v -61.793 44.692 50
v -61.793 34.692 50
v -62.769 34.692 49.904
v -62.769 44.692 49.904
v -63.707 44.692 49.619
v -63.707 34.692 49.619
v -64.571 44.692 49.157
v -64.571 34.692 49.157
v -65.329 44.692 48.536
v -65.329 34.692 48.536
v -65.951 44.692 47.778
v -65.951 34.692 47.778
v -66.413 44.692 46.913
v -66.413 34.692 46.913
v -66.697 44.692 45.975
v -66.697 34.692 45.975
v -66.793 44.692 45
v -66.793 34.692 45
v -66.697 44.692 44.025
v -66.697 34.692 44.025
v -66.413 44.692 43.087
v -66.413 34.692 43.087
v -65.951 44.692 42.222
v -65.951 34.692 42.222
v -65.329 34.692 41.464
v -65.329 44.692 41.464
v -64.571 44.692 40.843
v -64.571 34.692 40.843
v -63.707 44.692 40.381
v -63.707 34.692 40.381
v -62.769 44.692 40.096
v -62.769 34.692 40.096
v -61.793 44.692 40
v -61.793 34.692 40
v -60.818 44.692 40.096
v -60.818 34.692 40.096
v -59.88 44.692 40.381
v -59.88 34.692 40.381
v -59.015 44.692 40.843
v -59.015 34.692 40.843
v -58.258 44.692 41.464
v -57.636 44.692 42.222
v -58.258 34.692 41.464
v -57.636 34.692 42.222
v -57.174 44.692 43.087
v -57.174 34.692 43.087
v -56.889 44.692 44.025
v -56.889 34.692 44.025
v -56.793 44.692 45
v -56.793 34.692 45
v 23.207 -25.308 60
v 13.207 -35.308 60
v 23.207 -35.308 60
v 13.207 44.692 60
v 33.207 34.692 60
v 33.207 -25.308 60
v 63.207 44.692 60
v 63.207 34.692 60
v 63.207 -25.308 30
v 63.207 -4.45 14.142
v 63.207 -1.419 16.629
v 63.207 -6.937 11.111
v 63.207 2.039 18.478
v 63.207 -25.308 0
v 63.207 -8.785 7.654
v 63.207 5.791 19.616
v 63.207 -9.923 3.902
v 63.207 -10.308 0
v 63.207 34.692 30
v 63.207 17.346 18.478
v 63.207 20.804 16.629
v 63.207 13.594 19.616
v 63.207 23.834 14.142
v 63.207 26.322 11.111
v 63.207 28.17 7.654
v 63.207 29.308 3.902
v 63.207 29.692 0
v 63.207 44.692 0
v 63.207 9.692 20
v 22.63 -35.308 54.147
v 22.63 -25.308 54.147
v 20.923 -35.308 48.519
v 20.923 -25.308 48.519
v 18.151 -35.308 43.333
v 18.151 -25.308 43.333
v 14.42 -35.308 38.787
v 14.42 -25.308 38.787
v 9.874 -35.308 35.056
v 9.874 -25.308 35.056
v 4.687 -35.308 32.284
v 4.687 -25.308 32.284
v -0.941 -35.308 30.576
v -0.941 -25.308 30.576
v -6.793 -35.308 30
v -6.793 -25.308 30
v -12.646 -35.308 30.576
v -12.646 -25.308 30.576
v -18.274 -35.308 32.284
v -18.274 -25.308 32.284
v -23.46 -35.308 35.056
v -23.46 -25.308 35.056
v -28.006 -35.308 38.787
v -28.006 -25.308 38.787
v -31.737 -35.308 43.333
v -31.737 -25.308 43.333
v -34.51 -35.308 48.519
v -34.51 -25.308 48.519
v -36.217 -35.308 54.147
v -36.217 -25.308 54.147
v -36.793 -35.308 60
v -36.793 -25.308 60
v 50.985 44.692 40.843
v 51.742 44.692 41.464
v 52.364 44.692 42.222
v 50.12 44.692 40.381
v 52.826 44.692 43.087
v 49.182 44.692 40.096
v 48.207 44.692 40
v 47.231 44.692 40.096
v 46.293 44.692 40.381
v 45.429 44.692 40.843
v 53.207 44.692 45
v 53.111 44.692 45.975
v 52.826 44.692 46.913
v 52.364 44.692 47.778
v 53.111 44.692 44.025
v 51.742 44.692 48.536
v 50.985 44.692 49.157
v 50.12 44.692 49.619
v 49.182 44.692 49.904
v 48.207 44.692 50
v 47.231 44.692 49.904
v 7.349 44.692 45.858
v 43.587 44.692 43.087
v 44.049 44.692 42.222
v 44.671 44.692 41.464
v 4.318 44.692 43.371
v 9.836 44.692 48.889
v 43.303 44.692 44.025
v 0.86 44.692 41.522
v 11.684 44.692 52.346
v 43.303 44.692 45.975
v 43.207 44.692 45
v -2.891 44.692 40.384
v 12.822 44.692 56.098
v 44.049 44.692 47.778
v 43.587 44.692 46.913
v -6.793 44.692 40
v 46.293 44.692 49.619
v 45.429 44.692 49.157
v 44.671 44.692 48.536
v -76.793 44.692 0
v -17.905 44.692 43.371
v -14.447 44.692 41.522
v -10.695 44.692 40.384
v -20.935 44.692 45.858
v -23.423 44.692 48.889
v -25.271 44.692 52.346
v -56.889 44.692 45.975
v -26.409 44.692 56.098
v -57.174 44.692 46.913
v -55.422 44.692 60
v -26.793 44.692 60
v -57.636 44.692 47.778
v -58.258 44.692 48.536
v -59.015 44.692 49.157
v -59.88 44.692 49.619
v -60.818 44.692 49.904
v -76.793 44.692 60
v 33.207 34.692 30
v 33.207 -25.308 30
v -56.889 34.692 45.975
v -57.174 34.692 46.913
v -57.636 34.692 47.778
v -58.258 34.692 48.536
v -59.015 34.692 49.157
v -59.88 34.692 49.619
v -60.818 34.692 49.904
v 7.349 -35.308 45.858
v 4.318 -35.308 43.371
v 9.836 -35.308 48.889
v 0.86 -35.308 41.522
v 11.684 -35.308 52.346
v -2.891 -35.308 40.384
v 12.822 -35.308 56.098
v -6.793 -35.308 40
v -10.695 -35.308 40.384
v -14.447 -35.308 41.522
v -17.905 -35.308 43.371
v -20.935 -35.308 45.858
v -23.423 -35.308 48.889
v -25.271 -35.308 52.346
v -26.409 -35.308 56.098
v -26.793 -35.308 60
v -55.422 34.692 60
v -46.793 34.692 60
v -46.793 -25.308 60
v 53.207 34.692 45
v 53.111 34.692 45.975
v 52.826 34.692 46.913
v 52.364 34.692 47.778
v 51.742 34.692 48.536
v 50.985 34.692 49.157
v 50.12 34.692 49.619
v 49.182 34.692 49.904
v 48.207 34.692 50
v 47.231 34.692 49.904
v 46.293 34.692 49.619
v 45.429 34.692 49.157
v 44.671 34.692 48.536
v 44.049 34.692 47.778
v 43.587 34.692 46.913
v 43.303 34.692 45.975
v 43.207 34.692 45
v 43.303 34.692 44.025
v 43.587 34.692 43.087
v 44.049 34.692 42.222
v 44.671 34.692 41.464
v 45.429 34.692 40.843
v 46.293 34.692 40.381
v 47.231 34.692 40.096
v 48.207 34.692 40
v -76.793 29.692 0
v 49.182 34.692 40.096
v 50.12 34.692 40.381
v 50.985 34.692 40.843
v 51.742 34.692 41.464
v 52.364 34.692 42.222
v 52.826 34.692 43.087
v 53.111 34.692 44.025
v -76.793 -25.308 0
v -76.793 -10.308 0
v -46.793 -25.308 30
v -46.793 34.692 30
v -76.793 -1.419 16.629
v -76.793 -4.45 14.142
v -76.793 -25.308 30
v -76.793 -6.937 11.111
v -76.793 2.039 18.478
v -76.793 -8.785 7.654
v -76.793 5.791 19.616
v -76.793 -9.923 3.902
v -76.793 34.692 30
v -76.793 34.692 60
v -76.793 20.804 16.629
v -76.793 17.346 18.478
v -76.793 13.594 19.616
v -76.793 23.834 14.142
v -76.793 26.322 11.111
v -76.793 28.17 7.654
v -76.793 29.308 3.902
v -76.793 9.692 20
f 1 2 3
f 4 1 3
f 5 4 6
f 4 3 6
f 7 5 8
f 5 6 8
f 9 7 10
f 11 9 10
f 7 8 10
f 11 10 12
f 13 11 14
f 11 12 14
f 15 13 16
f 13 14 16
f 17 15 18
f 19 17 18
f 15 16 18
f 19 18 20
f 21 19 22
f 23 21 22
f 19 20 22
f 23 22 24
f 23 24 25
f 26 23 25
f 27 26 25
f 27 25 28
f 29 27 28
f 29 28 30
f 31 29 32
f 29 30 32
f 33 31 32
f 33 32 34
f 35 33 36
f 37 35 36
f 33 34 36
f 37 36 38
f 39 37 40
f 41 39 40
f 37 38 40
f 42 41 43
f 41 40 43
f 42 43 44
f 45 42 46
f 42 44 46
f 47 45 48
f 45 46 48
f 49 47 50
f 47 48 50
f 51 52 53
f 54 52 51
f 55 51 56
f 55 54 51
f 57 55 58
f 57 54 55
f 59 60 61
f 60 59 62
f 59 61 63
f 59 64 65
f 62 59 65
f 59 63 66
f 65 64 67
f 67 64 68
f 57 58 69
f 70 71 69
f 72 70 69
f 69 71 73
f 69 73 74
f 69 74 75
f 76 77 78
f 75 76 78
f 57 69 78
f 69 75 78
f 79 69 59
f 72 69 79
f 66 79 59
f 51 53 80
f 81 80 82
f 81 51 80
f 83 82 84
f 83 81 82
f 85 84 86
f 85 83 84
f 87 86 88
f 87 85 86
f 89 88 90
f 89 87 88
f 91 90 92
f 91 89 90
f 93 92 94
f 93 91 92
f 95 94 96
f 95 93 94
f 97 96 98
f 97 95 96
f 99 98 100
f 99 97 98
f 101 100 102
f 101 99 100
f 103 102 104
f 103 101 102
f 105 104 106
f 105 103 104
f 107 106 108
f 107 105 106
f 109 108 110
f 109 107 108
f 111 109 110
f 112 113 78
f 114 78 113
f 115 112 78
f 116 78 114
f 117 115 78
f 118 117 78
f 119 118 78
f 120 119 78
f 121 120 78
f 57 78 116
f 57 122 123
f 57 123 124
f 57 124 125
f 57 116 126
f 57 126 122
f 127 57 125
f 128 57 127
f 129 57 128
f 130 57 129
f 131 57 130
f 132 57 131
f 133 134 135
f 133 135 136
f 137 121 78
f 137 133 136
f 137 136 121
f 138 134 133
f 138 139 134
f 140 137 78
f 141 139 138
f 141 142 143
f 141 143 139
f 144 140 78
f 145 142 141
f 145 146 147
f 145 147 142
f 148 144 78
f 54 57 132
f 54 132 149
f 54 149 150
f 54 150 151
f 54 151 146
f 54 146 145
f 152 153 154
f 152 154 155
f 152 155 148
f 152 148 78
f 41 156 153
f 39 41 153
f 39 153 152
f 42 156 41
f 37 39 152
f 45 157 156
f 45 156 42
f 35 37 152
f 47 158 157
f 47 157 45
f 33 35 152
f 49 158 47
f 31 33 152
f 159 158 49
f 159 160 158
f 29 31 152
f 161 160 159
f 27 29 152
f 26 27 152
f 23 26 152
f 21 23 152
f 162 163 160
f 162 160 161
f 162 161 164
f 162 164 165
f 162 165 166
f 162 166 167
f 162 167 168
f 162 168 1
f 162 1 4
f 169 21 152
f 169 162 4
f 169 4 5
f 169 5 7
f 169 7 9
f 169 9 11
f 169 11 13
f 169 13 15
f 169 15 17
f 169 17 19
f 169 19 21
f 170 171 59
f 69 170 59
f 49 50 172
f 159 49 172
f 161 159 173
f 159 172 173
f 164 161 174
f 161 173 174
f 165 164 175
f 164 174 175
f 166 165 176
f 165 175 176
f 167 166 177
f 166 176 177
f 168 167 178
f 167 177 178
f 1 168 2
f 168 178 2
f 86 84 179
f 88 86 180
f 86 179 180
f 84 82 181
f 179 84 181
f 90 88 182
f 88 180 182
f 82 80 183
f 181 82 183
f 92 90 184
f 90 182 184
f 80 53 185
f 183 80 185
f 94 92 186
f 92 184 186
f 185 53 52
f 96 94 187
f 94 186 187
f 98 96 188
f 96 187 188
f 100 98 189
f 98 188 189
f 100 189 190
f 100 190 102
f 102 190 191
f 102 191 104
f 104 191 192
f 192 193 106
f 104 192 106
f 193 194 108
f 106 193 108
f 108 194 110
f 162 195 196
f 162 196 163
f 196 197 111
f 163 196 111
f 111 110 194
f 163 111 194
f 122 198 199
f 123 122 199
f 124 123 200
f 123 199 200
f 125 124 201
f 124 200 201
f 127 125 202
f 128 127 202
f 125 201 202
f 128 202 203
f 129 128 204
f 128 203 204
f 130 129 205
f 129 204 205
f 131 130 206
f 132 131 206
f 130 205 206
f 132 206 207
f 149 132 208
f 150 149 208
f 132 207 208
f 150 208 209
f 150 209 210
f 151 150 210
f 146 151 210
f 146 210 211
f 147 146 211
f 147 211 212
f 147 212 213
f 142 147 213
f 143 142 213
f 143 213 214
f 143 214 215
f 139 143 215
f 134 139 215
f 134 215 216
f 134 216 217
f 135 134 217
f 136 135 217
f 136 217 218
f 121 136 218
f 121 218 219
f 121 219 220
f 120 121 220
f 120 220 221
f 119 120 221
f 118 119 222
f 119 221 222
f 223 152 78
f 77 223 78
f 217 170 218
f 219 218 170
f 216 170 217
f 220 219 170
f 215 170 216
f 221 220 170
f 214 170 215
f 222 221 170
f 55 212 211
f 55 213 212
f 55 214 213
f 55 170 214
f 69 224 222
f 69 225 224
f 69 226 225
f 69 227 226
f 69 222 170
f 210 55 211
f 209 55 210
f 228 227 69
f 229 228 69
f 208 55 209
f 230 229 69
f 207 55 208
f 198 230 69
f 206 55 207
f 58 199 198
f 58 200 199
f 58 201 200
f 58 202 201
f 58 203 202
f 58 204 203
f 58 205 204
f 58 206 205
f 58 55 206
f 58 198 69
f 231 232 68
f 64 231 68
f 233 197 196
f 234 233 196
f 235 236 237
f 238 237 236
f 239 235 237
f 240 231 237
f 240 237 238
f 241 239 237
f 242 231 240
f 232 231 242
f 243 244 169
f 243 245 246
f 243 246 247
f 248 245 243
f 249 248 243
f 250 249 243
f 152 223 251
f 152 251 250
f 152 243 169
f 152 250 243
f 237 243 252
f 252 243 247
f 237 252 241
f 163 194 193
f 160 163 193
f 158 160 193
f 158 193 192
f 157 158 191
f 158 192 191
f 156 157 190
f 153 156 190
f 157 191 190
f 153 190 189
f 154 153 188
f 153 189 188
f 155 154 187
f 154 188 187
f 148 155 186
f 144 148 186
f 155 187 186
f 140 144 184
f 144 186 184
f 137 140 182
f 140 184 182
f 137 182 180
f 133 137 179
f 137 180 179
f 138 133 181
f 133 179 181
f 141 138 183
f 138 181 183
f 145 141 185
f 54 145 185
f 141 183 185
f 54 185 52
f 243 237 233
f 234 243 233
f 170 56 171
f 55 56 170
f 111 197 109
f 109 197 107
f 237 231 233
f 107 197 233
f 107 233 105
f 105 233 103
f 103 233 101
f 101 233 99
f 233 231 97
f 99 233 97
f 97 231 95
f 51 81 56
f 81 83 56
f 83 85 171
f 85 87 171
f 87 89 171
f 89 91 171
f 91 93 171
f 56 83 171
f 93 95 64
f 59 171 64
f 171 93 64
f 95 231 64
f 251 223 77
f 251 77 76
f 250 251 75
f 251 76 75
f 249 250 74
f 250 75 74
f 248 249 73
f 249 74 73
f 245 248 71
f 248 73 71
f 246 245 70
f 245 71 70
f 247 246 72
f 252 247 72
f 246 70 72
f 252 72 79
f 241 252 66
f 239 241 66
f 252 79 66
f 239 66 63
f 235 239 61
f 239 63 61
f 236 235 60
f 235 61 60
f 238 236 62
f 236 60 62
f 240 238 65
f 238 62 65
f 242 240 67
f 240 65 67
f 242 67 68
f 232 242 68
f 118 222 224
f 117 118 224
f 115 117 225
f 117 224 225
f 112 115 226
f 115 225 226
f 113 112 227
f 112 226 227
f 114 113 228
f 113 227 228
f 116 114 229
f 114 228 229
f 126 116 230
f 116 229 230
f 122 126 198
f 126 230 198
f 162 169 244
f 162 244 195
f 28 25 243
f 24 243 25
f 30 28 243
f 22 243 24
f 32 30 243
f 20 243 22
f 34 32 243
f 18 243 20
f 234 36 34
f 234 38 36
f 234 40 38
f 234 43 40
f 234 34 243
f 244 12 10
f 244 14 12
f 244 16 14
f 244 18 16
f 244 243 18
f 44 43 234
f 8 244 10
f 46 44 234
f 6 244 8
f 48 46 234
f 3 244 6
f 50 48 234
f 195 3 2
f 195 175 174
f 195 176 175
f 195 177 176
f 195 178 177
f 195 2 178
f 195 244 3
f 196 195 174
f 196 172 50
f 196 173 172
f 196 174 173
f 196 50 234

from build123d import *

# Parameters (mm, degrees)
F0_W      = 140
F0_H      = 70
F1_DEPTH  = 60
F2_R      = 20
F3_DEPTH  = 144.4
F4_W      = 30
F4_H      = 60
F5_DEPTH  = 30
F7_DEPTH  = 25
F8_R      = 30
F9_DEPTH  = 80
F10_R     = 20
F11_DEPTH = 80
F12_W     = 39.848283
F12_H     = 31.382198
F13_DEPTH = 80
F14_W     = 48.629179
F14_H     = 31.993205
F15_DEPTH = 80
F16_W     = 30
F16_H     = 60
F17_DEPTH = 30
F19_DEPTH = 10


with BuildPart() as f1:
    # F0 (on Top) → F1 (new body)
    with BuildSketch(Plane.XY):
        with Locations((-6.793272, 9.692355)):
            Rectangle(F0_W, F0_H)
    extrude(amount=F1_DEPTH)

    # F2 (on face) → F3 (cut)
    with BuildSketch(Plane.YZ.offset(63.206728)):
        with Locations((9.692355, 0)):
            Circle(F2_R)
    extrude(amount=-F3_DEPTH, mode=Mode.SUBTRACT)

    # F4 (on face) → F5 (cut)
    with BuildSketch(Plane.XY.offset(60)):
        with Locations((48.206728, 4.692355)):
            Rectangle(F4_W, F4_H)
    extrude(amount=-F5_DEPTH, mode=Mode.SUBTRACT)

    # F6 (on face) → F7 (cut)
    with BuildSketch(Plane.XZ.offset(-34.692355)):
        with BuildLine():
            ThreePointArc((53.206728, 45), (44.671194, 48.535534), (48.206728, 40))
            ThreePointArc((48.206728, 40), (51.742262, 41.464466), (53.206728, 45))
        make_face()
    extrude(amount=-F7_DEPTH, mode=Mode.SUBTRACT)

    # F8 (on face) → F9 (join)
    with BuildSketch(Plane(origin=(0, 44.692355, 0), x_dir=(-1, 0, 0), z_dir=(0, 1, 0))):
        with Locations((6.793272, 60)):
            Circle(F8_R)
    extrude(amount=-F9_DEPTH)

    # F10 (on face) → F11 (cut)
    with BuildSketch(Plane.XZ.offset(35.307645)):
        with Locations((-6.793272, 60)):
            Circle(F10_R)
    extrude(amount=-F11_DEPTH, mode=Mode.SUBTRACT)

    # F12 (on face) → F13 (cut)
    with BuildSketch(Plane.XZ.offset(35.307645)):
        with Locations((13.130869, 75.691099)):
            Rectangle(F12_W, F12_H)
    extrude(amount=-F13_DEPTH, mode=Mode.SUBTRACT)

    # F14 (on face) → F15 (cut)
    with BuildSketch(Plane.XZ.offset(35.307645)):
        with Locations((-31.107861, 75.996602)):
            Rectangle(F14_W, F14_H)
    extrude(amount=-F15_DEPTH, mode=Mode.SUBTRACT)

    # F16 (on face) → F17 (cut)
    with BuildSketch(Plane.XY.offset(60)):
        with Locations((-61.793272, 4.692355)):
            Rectangle(F16_W, F16_H)
    extrude(amount=-F17_DEPTH, mode=Mode.SUBTRACT)

    # F18 (on face) → F19 (cut)
    with BuildSketch(Plane.XZ.offset(-34.692355)):
        with BuildLine():
            ThreePointArc((-61.793272, 50), (-65.328806, 41.464466), (-56.793272, 45))
            ThreePointArc((-56.793272, 45), (-58.257738, 48.535534), (-61.793272, 50))
        make_face()
    extrude(amount=-F19_DEPTH, mode=Mode.SUBTRACT)


solid = f1.part
